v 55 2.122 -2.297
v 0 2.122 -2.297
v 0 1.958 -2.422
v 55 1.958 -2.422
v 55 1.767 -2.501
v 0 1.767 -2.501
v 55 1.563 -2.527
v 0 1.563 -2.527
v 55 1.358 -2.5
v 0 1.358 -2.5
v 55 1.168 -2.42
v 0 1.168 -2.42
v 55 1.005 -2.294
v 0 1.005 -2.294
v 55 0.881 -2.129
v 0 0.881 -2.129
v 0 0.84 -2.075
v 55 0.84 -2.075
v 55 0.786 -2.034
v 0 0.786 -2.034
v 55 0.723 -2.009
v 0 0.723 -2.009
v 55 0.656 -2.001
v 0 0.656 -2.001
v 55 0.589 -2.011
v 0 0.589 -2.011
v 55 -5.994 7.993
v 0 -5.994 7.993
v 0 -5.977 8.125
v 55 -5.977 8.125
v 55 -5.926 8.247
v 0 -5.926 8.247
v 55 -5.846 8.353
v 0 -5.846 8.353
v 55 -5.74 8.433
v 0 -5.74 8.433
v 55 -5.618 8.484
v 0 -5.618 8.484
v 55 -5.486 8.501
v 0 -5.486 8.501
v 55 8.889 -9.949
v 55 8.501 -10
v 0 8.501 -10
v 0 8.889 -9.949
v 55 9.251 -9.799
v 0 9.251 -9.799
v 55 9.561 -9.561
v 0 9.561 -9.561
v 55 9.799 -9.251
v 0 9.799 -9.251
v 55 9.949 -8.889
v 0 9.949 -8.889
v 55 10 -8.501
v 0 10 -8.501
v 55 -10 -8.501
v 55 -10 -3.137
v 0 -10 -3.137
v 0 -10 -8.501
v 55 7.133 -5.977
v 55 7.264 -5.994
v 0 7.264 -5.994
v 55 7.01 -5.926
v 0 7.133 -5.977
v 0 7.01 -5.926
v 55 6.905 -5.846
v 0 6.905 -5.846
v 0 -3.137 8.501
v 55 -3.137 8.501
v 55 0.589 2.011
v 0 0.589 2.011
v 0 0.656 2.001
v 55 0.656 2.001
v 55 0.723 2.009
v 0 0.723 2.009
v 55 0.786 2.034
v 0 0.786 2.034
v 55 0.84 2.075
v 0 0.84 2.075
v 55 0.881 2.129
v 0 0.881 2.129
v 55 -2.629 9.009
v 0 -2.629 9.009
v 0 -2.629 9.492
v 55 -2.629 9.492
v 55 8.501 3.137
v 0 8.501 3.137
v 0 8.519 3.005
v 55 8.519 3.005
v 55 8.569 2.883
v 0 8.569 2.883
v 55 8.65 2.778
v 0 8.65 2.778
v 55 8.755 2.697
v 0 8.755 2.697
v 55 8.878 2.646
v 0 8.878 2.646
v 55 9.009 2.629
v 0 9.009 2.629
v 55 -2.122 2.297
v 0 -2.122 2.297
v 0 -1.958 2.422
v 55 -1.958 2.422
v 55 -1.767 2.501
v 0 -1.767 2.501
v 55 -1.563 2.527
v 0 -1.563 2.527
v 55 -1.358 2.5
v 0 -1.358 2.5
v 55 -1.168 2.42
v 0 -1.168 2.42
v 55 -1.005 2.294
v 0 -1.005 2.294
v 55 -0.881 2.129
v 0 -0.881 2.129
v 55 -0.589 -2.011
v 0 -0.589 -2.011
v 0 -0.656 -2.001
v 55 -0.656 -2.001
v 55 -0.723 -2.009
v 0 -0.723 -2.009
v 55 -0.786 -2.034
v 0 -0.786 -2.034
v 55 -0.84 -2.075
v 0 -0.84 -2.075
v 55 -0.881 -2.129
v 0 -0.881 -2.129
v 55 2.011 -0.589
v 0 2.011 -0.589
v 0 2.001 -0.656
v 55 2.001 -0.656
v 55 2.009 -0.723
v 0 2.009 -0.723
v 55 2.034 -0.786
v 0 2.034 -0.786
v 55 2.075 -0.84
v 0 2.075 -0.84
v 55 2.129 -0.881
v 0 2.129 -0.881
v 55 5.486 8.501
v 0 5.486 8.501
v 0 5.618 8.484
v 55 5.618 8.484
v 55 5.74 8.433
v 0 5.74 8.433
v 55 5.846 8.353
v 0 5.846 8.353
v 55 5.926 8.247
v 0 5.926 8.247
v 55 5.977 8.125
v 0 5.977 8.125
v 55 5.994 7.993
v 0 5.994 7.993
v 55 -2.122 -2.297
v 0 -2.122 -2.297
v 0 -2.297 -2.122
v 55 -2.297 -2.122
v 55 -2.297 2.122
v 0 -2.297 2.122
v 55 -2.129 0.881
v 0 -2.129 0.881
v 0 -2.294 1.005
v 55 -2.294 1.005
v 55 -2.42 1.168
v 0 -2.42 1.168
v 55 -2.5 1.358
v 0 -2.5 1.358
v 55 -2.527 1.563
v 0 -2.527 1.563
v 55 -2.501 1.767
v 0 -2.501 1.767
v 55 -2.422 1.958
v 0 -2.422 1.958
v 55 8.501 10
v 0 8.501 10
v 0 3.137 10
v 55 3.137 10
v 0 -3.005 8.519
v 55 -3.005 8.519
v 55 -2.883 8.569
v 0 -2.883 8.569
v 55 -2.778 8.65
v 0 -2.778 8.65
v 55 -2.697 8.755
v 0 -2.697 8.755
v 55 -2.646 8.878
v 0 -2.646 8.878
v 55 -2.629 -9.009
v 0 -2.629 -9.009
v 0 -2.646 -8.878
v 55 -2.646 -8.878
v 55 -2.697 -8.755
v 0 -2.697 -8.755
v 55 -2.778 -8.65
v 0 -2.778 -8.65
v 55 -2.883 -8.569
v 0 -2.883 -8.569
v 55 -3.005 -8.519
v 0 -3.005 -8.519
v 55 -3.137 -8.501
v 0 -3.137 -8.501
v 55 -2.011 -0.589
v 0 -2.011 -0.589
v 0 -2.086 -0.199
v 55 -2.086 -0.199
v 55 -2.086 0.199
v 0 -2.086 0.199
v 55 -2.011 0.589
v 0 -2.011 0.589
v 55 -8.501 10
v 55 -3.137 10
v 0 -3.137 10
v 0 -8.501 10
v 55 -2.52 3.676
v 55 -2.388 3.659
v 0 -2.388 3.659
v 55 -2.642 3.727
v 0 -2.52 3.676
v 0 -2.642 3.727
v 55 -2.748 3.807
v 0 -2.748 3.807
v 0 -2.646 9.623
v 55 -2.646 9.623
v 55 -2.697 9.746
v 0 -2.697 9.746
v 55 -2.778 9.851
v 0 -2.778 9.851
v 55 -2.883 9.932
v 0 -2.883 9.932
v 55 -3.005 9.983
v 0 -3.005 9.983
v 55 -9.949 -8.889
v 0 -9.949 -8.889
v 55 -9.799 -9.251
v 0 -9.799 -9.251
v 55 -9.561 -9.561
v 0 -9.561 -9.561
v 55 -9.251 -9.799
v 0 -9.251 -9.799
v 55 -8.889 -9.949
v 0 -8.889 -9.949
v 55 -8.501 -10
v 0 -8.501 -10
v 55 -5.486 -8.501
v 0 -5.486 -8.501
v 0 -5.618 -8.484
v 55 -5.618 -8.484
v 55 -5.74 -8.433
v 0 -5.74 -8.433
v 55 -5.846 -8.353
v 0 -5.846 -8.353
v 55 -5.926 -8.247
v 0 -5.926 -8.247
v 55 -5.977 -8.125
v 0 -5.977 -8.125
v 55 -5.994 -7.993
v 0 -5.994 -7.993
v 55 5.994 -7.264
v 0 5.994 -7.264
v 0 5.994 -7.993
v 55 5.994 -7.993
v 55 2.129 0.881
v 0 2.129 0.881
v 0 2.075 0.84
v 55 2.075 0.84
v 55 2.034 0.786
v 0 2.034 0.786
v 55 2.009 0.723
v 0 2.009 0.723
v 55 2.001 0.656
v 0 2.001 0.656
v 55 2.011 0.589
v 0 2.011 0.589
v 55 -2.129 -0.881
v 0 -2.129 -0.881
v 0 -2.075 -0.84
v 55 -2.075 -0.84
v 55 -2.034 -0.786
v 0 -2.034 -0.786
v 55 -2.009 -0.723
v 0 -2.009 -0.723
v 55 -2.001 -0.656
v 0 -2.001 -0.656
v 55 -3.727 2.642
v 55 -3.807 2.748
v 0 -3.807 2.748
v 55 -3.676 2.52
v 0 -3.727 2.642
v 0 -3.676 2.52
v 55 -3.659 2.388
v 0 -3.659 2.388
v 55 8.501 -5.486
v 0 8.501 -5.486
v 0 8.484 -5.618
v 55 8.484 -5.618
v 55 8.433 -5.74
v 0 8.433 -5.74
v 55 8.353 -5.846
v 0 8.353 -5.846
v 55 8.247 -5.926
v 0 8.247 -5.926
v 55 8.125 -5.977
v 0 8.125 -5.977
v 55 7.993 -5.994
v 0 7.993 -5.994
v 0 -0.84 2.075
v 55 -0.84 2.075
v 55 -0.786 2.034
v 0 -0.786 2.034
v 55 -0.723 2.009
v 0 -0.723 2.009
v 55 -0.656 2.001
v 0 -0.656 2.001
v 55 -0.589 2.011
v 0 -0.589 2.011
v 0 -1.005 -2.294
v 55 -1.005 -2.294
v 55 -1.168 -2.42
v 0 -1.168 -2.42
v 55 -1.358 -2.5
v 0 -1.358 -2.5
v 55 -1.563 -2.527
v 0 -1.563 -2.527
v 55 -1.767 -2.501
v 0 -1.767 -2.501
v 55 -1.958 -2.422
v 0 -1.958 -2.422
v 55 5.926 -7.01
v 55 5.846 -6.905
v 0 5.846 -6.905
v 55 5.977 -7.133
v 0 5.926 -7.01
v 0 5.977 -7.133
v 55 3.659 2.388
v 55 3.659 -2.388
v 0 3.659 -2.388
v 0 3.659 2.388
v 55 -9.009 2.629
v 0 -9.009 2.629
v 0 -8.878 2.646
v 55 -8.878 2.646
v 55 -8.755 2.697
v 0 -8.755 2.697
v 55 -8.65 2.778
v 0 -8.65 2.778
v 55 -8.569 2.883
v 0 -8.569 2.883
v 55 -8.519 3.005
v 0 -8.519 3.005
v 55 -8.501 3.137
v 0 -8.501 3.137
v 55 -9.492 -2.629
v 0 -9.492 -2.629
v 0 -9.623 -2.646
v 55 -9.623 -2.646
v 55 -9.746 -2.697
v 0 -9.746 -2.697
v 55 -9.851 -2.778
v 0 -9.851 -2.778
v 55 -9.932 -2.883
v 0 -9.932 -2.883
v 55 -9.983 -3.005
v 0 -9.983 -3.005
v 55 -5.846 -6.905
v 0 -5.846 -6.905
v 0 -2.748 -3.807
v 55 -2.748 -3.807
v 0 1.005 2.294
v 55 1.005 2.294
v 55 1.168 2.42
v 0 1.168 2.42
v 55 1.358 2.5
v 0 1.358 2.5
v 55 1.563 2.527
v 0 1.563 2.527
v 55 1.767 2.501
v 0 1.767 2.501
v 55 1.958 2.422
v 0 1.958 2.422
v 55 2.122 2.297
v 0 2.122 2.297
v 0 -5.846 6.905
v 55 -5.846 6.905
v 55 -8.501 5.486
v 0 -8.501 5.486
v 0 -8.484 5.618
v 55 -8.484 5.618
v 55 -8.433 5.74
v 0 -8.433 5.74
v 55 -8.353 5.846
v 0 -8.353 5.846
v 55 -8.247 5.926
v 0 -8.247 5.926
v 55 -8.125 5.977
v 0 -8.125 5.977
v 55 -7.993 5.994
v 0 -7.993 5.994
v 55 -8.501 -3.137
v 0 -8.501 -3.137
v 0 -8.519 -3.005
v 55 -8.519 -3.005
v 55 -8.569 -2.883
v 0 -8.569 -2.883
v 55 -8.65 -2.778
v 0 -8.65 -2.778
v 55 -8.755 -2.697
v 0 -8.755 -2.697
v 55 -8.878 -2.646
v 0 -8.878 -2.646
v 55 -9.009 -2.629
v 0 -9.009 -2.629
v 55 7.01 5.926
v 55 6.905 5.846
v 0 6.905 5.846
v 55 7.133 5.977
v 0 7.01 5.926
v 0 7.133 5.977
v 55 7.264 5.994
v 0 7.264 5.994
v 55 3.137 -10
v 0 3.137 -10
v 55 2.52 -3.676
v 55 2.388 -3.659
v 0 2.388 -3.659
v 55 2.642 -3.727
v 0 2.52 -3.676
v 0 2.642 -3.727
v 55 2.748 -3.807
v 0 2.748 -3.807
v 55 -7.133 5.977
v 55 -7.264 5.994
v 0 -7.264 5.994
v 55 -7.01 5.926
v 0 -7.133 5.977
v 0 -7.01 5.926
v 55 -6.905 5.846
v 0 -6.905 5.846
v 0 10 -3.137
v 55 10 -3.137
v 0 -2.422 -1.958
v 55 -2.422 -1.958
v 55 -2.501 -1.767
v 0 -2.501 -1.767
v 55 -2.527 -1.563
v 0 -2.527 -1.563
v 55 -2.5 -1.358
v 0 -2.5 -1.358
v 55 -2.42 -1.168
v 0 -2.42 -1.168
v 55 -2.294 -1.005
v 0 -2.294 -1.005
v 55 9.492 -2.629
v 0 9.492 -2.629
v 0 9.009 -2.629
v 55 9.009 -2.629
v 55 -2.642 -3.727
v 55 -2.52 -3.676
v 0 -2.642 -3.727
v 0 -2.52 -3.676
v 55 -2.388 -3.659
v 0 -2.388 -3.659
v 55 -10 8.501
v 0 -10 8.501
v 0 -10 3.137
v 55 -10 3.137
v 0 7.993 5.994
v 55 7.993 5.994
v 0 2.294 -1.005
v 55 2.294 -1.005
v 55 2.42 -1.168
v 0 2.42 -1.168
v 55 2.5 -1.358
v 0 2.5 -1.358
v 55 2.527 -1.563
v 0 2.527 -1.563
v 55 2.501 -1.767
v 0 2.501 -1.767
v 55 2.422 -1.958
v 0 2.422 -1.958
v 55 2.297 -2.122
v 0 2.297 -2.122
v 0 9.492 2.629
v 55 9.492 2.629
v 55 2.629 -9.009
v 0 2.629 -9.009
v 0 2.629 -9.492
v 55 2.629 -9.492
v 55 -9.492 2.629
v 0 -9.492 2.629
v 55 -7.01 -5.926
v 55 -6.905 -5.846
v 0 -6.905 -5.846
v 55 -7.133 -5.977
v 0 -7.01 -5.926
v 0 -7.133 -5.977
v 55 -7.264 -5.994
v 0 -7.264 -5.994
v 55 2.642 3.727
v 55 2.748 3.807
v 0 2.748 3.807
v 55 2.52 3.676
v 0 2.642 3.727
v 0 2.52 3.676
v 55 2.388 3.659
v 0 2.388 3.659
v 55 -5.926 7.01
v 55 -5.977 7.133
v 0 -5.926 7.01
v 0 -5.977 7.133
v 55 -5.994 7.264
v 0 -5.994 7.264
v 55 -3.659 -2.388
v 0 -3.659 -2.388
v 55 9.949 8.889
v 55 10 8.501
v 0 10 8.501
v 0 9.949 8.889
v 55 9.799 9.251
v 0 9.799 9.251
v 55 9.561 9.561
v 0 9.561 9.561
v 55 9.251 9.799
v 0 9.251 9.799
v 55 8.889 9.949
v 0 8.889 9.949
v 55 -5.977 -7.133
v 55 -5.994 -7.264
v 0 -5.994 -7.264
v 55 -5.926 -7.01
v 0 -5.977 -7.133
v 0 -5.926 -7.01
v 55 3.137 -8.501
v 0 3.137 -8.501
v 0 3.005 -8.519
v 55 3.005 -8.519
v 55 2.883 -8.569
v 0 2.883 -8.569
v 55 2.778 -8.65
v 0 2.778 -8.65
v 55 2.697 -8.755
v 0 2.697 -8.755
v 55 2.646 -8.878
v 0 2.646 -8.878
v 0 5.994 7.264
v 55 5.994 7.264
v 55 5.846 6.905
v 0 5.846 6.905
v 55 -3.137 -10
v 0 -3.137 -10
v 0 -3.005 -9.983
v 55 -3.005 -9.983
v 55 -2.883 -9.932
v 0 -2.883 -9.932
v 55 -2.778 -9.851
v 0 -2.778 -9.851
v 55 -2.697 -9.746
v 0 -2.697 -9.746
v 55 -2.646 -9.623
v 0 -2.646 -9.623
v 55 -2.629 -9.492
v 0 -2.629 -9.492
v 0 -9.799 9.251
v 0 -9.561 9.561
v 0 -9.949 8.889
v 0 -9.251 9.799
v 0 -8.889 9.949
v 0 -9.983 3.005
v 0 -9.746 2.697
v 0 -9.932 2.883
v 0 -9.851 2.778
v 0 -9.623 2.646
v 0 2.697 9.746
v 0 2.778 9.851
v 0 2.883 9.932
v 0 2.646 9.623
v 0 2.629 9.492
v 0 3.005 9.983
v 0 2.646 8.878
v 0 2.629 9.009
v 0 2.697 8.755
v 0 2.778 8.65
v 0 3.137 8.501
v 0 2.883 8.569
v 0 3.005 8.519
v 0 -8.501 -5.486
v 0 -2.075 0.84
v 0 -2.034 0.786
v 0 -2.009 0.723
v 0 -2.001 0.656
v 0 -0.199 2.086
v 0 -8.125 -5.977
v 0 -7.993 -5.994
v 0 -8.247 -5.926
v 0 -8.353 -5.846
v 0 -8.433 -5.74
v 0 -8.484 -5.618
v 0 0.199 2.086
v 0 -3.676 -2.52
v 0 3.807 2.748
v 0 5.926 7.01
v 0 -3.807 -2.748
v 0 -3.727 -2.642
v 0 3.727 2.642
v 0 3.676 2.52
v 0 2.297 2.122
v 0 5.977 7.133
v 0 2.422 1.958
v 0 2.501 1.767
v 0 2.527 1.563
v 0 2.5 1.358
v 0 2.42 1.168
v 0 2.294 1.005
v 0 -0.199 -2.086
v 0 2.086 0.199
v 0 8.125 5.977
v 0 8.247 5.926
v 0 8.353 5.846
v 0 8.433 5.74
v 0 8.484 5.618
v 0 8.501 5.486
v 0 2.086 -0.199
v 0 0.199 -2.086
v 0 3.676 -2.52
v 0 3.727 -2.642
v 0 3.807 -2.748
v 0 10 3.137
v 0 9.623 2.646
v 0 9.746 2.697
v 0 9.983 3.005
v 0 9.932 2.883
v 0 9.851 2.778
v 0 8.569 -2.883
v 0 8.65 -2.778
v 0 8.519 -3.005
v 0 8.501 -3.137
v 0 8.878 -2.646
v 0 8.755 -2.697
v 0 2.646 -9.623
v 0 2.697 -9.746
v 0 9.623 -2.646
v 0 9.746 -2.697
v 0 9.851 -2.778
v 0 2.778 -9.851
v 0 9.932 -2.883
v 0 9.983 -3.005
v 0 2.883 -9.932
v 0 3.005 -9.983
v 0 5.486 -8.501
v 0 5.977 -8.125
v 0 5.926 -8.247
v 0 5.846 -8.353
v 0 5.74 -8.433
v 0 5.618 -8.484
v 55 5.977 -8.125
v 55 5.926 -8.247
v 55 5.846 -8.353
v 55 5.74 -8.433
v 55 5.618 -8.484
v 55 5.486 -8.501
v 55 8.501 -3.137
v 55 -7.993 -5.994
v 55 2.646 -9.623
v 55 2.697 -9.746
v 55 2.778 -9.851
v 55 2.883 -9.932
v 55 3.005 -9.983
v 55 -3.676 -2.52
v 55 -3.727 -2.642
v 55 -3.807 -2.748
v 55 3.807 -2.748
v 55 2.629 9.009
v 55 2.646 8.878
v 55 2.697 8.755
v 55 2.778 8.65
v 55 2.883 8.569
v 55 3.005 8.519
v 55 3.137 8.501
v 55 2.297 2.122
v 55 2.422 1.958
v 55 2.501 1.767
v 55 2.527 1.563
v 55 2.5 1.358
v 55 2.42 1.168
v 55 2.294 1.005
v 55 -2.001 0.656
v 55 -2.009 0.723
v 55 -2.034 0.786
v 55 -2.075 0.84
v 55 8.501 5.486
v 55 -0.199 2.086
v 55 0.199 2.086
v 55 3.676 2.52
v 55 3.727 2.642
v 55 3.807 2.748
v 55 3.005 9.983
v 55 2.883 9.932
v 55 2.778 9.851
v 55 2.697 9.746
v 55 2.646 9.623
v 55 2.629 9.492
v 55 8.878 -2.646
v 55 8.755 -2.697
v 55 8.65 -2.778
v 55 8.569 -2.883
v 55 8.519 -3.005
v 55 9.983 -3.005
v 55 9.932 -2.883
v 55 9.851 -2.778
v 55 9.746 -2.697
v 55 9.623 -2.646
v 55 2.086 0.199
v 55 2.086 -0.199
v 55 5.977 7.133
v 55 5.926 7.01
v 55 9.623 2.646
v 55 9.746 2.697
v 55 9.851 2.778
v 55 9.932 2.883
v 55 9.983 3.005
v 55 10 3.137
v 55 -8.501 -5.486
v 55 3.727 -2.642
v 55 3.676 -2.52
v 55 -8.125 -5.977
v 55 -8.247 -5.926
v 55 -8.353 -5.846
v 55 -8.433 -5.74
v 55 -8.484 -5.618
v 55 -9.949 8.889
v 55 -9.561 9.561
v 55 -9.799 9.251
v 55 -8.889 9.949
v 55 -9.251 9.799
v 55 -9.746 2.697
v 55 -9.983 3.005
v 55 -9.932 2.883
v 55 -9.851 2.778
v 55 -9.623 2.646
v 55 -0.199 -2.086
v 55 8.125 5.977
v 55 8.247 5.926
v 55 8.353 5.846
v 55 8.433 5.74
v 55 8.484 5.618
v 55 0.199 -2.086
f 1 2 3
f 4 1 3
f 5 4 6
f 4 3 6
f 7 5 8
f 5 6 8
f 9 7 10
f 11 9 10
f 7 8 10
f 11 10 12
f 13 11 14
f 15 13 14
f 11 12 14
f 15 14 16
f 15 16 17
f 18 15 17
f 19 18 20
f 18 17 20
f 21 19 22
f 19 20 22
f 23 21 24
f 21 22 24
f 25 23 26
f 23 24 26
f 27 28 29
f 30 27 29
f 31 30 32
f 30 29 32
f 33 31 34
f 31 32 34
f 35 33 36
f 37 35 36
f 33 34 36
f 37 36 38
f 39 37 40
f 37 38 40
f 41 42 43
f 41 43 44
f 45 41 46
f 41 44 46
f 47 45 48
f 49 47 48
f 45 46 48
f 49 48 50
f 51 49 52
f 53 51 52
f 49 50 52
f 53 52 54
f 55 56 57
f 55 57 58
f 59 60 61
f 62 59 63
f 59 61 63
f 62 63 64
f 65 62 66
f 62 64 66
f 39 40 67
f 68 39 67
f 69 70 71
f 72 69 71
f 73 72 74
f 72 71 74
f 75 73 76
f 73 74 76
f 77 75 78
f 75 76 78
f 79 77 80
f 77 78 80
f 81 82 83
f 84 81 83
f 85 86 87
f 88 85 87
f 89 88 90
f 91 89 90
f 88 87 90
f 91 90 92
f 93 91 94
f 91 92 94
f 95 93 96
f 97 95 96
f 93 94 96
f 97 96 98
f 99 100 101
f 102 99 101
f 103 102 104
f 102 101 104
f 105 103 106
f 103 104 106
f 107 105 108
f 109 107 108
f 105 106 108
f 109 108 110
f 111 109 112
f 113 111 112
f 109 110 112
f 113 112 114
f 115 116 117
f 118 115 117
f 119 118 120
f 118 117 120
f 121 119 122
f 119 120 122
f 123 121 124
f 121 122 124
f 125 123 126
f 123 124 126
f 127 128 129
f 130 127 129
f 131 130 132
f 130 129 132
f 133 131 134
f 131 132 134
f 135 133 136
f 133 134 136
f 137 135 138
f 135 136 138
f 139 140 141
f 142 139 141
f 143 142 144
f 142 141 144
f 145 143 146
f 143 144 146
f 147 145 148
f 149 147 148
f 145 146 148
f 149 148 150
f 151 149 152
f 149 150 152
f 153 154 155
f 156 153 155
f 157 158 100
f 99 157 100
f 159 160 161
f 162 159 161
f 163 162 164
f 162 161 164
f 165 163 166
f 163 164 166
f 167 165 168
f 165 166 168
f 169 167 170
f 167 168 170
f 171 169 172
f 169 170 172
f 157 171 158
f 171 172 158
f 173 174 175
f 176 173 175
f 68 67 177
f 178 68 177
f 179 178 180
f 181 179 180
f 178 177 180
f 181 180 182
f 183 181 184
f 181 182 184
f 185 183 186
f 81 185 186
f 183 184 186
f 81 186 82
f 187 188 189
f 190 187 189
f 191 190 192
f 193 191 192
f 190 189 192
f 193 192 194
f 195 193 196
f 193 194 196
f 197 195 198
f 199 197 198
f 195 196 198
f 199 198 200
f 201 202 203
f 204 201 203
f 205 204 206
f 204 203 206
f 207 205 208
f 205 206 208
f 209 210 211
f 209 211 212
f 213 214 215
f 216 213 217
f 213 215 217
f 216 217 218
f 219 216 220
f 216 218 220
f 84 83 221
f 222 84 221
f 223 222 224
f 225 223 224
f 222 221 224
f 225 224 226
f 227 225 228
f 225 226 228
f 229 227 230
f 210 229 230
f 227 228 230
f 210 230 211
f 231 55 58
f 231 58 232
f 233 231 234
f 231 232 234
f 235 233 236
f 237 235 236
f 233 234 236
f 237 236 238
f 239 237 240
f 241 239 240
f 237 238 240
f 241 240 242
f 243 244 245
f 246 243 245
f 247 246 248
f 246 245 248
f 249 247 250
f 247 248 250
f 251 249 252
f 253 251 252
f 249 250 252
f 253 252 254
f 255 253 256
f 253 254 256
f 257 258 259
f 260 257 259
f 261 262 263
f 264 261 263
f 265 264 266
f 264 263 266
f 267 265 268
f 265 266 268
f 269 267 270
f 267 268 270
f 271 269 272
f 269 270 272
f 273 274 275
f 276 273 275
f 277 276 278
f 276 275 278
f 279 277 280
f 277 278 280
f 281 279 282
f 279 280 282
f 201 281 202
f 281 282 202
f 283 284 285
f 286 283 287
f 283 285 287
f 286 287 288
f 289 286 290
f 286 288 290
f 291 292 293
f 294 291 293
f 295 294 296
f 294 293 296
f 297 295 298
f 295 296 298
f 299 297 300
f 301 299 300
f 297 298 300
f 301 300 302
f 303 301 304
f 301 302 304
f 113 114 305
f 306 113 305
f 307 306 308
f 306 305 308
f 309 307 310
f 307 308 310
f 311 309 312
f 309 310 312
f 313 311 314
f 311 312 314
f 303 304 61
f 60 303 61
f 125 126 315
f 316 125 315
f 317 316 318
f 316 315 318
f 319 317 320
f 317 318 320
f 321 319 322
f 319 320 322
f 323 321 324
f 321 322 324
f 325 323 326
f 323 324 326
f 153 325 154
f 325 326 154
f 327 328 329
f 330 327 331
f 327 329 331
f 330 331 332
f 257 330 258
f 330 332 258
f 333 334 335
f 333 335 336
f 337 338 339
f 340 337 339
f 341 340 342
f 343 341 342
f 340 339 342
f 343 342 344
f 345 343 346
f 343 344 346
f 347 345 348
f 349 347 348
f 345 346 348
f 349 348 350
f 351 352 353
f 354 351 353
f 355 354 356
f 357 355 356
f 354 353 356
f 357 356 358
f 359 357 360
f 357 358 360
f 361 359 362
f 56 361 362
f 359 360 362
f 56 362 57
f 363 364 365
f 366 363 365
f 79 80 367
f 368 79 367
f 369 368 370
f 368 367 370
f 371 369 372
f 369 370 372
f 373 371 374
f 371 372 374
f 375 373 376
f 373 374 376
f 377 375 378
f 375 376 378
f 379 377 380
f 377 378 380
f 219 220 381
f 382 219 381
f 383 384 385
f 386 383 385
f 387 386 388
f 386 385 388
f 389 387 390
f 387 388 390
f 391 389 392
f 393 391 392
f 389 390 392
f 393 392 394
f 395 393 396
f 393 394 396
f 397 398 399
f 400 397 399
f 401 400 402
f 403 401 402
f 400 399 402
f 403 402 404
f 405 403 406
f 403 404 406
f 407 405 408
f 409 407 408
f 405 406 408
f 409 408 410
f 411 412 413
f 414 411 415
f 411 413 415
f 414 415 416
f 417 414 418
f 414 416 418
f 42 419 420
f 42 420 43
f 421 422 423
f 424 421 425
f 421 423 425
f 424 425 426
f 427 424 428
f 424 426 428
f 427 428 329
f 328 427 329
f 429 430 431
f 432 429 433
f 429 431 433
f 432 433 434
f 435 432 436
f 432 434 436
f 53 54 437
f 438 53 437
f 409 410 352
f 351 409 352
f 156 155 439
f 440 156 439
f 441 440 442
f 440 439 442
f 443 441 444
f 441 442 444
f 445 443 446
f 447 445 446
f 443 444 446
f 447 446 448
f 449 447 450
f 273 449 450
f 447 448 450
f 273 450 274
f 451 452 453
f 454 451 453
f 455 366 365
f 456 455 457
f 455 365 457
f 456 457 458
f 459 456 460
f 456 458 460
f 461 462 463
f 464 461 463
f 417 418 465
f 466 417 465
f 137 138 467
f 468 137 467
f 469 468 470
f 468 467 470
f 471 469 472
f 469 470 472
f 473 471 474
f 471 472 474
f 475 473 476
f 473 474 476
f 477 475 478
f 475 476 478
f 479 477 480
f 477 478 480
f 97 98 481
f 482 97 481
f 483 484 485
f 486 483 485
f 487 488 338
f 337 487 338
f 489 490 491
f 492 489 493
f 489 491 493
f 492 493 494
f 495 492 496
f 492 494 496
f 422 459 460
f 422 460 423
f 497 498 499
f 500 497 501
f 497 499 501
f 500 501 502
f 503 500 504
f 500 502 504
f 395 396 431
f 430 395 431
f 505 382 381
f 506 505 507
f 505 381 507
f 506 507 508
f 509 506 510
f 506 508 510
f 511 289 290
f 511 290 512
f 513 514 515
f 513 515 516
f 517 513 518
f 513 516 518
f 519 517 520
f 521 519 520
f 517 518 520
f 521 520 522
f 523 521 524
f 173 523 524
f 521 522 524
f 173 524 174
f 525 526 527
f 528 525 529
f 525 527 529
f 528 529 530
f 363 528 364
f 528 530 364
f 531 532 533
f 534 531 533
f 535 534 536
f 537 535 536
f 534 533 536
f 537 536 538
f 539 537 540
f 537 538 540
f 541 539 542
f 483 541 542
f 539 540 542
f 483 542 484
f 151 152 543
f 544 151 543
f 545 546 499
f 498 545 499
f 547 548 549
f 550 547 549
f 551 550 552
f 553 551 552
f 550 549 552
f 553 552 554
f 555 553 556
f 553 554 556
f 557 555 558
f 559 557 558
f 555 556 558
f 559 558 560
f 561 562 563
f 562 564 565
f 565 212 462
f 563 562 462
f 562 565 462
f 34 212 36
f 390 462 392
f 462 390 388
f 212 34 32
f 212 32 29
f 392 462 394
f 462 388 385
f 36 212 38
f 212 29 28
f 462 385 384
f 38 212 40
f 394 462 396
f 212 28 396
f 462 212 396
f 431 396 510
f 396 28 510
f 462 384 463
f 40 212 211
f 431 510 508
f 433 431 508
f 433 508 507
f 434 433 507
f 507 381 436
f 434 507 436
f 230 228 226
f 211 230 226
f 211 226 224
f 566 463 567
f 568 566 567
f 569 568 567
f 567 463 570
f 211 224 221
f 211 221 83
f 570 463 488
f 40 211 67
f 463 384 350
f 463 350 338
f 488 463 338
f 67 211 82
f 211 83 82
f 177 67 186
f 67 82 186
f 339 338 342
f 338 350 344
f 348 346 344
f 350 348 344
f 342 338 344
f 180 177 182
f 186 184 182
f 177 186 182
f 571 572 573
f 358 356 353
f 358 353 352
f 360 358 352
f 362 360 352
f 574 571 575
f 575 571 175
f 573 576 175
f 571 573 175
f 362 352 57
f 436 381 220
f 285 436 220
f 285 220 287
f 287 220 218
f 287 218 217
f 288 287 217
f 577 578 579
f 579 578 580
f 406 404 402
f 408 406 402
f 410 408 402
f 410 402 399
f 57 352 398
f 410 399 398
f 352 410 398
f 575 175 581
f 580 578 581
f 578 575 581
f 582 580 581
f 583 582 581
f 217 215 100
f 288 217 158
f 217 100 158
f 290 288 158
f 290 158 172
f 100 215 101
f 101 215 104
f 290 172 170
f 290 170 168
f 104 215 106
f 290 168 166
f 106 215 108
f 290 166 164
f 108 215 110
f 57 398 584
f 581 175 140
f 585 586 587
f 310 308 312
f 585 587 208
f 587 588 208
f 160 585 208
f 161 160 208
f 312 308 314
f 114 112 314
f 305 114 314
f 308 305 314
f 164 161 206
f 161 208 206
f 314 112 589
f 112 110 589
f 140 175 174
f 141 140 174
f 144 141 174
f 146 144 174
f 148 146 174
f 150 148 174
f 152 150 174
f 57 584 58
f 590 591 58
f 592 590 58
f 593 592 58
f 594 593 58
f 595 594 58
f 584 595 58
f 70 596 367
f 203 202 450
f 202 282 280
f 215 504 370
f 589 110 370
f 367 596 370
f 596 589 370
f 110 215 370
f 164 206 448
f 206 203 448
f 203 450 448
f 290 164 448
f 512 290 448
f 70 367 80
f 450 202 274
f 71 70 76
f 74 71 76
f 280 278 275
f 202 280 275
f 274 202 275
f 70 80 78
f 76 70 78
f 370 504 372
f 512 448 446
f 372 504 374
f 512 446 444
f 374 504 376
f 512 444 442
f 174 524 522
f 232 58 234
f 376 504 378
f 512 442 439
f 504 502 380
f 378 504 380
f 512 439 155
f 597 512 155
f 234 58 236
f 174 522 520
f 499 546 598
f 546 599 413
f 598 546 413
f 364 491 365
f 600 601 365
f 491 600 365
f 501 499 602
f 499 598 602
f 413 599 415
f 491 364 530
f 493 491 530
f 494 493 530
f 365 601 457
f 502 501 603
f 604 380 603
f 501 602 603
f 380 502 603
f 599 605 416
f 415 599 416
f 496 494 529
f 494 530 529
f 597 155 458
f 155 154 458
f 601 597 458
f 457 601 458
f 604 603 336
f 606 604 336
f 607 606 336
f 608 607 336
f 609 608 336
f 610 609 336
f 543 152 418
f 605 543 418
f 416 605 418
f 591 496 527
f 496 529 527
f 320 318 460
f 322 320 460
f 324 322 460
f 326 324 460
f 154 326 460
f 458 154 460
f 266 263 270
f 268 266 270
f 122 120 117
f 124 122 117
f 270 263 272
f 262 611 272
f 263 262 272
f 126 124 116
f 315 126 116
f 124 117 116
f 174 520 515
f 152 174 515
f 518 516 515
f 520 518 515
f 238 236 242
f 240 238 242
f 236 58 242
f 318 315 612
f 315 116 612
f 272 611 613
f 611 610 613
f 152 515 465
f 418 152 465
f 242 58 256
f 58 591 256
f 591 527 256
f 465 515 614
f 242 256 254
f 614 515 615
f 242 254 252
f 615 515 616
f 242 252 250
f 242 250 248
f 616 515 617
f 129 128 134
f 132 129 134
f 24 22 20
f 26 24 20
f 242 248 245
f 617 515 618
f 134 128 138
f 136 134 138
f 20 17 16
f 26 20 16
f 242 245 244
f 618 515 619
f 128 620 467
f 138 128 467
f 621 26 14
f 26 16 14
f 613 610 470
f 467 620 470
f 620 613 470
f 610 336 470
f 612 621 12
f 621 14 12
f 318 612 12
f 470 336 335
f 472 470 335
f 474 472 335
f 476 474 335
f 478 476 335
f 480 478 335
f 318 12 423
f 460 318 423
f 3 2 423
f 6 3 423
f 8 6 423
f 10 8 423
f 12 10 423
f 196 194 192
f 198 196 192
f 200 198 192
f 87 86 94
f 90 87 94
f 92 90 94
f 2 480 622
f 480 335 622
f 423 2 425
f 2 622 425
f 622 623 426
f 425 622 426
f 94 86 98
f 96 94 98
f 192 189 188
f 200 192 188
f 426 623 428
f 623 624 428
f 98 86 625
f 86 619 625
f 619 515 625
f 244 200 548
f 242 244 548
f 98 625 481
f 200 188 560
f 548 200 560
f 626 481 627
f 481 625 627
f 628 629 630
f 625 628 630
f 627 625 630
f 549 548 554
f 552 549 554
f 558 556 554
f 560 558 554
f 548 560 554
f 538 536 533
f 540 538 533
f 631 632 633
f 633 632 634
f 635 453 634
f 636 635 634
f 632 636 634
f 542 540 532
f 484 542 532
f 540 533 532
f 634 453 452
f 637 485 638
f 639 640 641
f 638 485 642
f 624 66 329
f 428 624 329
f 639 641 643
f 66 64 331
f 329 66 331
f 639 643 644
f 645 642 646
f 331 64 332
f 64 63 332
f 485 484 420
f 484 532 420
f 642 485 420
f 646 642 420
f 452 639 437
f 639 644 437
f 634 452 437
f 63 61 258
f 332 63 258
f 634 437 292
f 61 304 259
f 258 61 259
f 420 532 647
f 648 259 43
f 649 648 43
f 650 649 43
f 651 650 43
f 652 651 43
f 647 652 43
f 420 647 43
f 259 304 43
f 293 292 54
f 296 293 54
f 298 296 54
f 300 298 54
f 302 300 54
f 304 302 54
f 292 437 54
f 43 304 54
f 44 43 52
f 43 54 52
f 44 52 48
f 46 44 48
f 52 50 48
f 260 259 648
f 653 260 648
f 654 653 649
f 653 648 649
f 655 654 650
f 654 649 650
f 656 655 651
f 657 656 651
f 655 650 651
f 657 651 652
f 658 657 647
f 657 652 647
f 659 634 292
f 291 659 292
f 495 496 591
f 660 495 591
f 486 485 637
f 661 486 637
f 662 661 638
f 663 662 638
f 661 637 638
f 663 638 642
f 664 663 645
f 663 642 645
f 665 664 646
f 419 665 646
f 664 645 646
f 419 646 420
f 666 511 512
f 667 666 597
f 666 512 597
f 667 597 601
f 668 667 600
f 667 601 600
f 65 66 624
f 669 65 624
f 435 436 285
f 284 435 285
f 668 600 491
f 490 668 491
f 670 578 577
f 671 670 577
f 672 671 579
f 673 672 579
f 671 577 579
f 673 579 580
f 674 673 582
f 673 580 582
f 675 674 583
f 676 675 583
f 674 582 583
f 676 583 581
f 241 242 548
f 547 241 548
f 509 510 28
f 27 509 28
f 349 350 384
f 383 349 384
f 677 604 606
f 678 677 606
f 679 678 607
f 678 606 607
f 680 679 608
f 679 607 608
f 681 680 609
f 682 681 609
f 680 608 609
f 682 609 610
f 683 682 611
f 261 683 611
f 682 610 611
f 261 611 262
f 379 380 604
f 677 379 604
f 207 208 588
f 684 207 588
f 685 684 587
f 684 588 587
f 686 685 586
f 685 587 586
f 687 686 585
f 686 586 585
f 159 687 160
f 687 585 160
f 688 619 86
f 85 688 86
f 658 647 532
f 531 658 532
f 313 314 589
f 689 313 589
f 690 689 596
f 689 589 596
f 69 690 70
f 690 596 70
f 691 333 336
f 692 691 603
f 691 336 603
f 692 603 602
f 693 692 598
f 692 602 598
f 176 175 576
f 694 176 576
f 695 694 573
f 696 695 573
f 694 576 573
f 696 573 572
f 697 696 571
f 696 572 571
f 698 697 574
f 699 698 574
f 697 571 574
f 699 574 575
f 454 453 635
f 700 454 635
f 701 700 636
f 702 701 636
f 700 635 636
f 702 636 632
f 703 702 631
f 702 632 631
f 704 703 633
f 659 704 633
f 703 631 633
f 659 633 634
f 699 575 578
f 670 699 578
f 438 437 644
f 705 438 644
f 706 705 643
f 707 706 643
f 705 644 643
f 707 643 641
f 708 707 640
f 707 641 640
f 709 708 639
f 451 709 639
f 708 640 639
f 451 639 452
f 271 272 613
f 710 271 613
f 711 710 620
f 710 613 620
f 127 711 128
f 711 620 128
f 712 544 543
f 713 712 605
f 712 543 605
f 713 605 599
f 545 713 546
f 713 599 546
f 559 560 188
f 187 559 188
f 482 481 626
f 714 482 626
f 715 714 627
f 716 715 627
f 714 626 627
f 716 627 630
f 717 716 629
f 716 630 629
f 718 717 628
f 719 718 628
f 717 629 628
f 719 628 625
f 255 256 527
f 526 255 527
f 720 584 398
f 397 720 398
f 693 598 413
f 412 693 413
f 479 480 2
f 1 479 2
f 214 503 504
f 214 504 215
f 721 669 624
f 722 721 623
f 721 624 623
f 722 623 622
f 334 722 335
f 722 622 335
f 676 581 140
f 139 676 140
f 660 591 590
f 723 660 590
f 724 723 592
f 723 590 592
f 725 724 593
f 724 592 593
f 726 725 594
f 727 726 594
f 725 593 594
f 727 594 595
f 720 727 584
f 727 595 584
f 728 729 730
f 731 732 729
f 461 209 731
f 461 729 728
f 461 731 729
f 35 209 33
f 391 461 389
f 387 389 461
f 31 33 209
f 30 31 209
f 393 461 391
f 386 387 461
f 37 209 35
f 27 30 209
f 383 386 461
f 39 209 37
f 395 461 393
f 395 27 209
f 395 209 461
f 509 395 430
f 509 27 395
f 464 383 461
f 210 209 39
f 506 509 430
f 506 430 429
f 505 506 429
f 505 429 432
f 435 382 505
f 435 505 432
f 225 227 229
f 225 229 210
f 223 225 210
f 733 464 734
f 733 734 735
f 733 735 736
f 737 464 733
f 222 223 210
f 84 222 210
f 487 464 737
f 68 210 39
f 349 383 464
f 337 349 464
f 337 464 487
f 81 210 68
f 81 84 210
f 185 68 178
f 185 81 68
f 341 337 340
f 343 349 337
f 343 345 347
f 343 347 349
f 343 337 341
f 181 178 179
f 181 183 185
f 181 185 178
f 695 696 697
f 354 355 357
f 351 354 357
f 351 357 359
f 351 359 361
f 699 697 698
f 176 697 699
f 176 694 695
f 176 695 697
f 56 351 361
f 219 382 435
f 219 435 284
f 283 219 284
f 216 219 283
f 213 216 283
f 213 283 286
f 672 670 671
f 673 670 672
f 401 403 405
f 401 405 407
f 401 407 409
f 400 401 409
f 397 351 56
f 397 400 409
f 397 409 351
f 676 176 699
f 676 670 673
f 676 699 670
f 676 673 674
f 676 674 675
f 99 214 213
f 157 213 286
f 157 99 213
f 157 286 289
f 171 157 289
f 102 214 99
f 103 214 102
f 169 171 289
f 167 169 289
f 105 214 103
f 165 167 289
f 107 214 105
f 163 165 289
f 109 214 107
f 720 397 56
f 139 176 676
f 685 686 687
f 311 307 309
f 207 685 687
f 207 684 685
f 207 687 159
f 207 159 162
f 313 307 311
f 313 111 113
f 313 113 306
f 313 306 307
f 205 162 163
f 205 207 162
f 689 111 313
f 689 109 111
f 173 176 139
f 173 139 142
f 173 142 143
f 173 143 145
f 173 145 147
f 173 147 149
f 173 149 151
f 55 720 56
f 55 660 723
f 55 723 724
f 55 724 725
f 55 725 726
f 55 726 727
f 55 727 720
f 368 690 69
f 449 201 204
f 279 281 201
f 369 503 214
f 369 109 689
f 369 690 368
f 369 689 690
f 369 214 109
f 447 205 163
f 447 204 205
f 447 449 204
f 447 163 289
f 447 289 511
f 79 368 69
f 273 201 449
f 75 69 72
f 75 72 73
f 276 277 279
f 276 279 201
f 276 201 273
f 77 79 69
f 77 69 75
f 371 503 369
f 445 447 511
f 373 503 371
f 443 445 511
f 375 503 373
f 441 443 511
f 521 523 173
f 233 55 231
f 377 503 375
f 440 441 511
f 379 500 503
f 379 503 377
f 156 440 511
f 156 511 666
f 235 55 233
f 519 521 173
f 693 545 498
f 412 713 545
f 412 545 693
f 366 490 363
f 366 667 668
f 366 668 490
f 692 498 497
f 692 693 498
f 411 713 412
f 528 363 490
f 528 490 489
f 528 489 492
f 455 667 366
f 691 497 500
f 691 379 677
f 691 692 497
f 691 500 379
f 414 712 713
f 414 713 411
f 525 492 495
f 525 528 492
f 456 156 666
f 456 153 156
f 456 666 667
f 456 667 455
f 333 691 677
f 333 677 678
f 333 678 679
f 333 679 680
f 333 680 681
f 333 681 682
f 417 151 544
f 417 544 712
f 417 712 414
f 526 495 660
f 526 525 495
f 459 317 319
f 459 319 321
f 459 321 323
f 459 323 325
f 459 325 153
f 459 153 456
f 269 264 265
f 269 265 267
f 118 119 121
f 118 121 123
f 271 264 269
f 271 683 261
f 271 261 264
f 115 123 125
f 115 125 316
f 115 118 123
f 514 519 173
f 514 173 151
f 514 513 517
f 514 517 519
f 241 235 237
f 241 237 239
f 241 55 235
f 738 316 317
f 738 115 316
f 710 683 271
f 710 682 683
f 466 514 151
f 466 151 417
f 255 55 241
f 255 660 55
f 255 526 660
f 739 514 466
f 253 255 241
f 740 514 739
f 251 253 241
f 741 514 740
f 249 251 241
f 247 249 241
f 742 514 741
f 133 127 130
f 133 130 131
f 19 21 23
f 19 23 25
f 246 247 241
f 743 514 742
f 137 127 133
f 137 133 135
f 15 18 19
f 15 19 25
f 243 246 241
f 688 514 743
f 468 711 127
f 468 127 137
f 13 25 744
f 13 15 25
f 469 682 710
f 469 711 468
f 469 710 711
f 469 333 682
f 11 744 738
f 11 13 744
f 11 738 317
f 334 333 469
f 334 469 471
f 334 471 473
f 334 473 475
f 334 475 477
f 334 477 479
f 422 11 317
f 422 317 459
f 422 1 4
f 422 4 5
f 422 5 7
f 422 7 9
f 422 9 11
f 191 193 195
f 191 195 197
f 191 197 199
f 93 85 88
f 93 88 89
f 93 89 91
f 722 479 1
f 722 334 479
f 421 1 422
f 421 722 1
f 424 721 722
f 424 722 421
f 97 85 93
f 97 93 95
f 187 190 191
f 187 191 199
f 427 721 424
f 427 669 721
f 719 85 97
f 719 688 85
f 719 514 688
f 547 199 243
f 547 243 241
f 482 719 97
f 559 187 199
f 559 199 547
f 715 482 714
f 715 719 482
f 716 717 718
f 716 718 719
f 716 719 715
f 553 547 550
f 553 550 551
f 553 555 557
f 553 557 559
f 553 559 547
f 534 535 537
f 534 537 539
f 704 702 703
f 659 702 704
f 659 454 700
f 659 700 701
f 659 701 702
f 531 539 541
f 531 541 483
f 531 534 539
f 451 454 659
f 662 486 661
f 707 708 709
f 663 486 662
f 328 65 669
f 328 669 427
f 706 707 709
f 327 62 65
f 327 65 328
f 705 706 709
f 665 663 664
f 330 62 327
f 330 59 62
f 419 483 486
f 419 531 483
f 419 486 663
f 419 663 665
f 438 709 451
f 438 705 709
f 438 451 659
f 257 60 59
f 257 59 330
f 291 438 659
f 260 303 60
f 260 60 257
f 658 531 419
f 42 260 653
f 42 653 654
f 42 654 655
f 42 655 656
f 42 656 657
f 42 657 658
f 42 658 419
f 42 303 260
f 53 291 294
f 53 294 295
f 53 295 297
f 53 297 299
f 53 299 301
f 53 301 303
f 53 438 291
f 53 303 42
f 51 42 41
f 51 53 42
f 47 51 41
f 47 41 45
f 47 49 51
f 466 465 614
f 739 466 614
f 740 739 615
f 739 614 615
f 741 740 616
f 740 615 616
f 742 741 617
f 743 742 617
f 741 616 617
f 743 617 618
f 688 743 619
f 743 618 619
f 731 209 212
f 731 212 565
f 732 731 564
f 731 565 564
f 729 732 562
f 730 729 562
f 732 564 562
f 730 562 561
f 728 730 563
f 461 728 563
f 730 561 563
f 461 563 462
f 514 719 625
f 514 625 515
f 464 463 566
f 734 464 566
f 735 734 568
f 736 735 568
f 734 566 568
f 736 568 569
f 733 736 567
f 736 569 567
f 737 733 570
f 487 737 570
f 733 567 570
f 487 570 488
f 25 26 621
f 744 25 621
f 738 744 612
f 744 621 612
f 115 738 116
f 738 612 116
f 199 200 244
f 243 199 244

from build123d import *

# Parameters (mm, degrees)
F_20_SERIES_20_2020_1_DEPTH = 55


with BuildPart() as part:
    # Sketch11 → 20_series 20-2020(1) (new body)
    with BuildSketch(Plane(origin=(0, 0, 0), x_dir=(0, 0, -1), z_dir=(1, 0, 0))):
        with BuildLine():
            Line((9.0094, 2.6289), (9.492, 2.6289))
            ThreePointArc((9.492, 2.6289), (9.851210245, 2.777689755), (10, 3.1369))
            Line((10, 3.1369), (10, 8.5014))
            ThreePointArc((10, 8.5014), (9.561070222, 9.561070222), (8.5014, 10))
            Line((8.5014, 10), (3.1369, 10))
            ThreePointArc((3.1369, 10), (2.777689755, 9.851210245), (2.6289, 9.492))
            Line((2.6289, 9.492), (2.6289, 9.0094))
            ThreePointArc((2.6289, 9.0094), (2.777689755, 8.650189755), (3.1369, 8.5014))
            Line((3.1369, 8.5014), (5.4864, 8.5014))
            ThreePointArc((5.4864, 8.5014), (5.845610245, 8.352610245), (5.9944, 7.9934))
            Line((5.9944, 7.9934), (5.9944, 7.264490712))
            ThreePointArc((5.9944, 7.264490712), (5.955730803, 7.070087528), (5.845610245, 6.905280467))
            Line((5.845610245, 6.905280467), (2.747686782, 3.807357004))
            ThreePointArc((2.747686782, 3.807357004), (2.582879721, 3.697236446), (2.388476537, 3.658567249))
            Line((2.388476537, 3.658567249), (-2.388476537, 3.658567249))
            ThreePointArc((-2.388476537, 3.658567249), (-2.582879721, 3.697236446), (-2.747686782, 3.807357004))
            Line((-2.747686782, 3.807357004), (-5.845610245, 6.905280467))
            ThreePointArc((-5.845610245, 6.905280467), (-5.955730803, 7.070087528), (-5.9944, 7.264490712))
            Line((-5.9944, 7.264490712), (-5.9944, 7.9934))
            ThreePointArc((-5.9944, 7.9934), (-5.845610245, 8.352610245), (-5.4864, 8.5014))
            Line((-5.4864, 8.5014), (-3.1369, 8.5014))
            ThreePointArc((-3.1369, 8.5014), (-2.777689755, 8.650189755), (-2.6289, 9.0094))
            Line((-2.6289, 9.0094), (-2.6289, 9.492))
            ThreePointArc((-2.6289, 9.492), (-2.777689755, 9.851210245), (-3.1369, 10))
            Line((-3.1369, 10), (-8.5014, 10))
            ThreePointArc((-8.5014, 10), (-9.561070222, 9.561070222), (-10, 8.5014))
            Line((-10, 8.5014), (-10, 3.1369))
            ThreePointArc((-10, 3.1369), (-9.851210245, 2.777689755), (-9.492, 2.6289))
            Line((-9.492, 2.6289), (-9.0094, 2.6289))
            ThreePointArc((-9.0094, 2.6289), (-8.650189755, 2.777689755), (-8.5014, 3.1369))
            Line((-8.5014, 3.1369), (-8.5014, 5.4864))
            ThreePointArc((-8.5014, 5.4864), (-8.352610245, 5.845610245), (-7.9934, 5.9944))
            Line((-7.9934, 5.9944), (-7.264490712, 5.9944))
            ThreePointArc((-7.264490712, 5.9944), (-7.070087528, 5.955730803), (-6.905280467, 5.845610245))
            Line((-6.905280467, 5.845610245), (-3.807357004, 2.747686782))
            ThreePointArc((-3.807357004, 2.747686782), (-3.697236446, 2.582879721), (-3.658567249, 2.388476537))
            Line((-3.658567249, 2.388476537), (-3.658567249, -2.388476537))
            ThreePointArc((-3.658567249, -2.388476537), (-3.697236446, -2.582879721), (-3.807357004, -2.747686782))
            Line((-3.807357004, -2.747686782), (-6.905280467, -5.845610245))
            ThreePointArc((-6.905280467, -5.845610245), (-7.070087528, -5.955730803), (-7.264490712, -5.9944))
            Line((-7.264490712, -5.9944), (-7.9934, -5.9944))
            ThreePointArc((-7.9934, -5.9944), (-8.352610245, -5.845610245), (-8.5014, -5.4864))
            Line((-8.5014, -5.4864), (-8.5014, -3.1369))
            ThreePointArc((-8.5014, -3.1369), (-8.650189755, -2.777689755), (-9.0094, -2.6289))
            Line((-9.0094, -2.6289), (-9.492, -2.6289))
            ThreePointArc((-9.492, -2.6289), (-9.851210245, -2.777689755), (-10, -3.1369))
            Line((-10, -3.1369), (-10, -8.5014))
            ThreePointArc((-10, -8.5014), (-9.561070222, -9.561070222), (-8.5014, -10))
            Line((-8.5014, -10), (-3.1369, -10))
            ThreePointArc((-3.1369, -10), (-2.777689755, -9.851210245), (-2.6289, -9.492))
            Line((-2.6289, -9.492), (-2.6289, -9.0094))
            ThreePointArc((-2.6289, -9.0094), (-2.777689755, -8.650189755), (-3.1369, -8.5014))
            Line((-3.1369, -8.5014), (-5.4864, -8.5014))
            ThreePointArc((-5.4864, -8.5014), (-5.845610245, -8.352610245), (-5.9944, -7.9934))
            Line((-5.9944, -7.9934), (-5.9944, -7.264490712))
            ThreePointArc((-5.9944, -7.264490712), (-5.955730803, -7.070087528), (-5.845610245, -6.905280467))
            Line((-5.845610245, -6.905280467), (-2.747686782, -3.807357004))
            ThreePointArc((-2.747686782, -3.807357004), (-2.582879721, -3.697236446), (-2.388476537, -3.658567249))
            Line((-2.388476537, -3.658567249), (2.388476537, -3.658567249))
            ThreePointArc((2.388476537, -3.658567249), (2.582879721, -3.697236446), (2.747686782, -3.807357004))
            Line((2.747686782, -3.807357004), (5.845610245, -6.905280467))
            ThreePointArc((5.845610245, -6.905280467), (5.955730803, -7.070087528), (5.9944, -7.264490712))
            Line((5.9944, -7.264490712), (5.9944, -7.9934))
            ThreePointArc((5.9944, -7.9934), (5.845610245, -8.352610245), (5.4864, -8.5014))
            Line((5.4864, -8.5014), (3.1369, -8.5014))
            ThreePointArc((3.1369, -8.5014), (2.777689755, -8.650189755), (2.6289, -9.0094))
            Line((2.6289, -9.0094), (2.6289, -9.492))
            ThreePointArc((2.6289, -9.492), (2.777689755, -9.851210245), (3.1369, -10))
            Line((3.1369, -10), (8.5014, -10))
            ThreePointArc((8.5014, -10), (9.561070222, -9.561070222), (10, -8.5014))
            Line((10, -8.5014), (10, -3.1369))
            ThreePointArc((10, -3.1369), (9.851210245, -2.777689755), (9.492, -2.6289))
            Line((9.492, -2.6289), (9.0094, -2.6289))
            ThreePointArc((9.0094, -2.6289), (8.650189755, -2.777689755), (8.5014, -3.1369))
            Line((8.5014, -3.1369), (8.5014, -5.4864))
            ThreePointArc((8.5014, -5.4864), (8.352610245, -5.845610245), (7.9934, -5.9944))
            Line((7.9934, -5.9944), (7.264490712, -5.9944))
            ThreePointArc((7.264490712, -5.9944), (7.070087528, -5.955730803), (6.905280467, -5.845610245))
            Line((6.905280467, -5.845610245), (3.807357004, -2.747686782))
            ThreePointArc((3.807357004, -2.747686782), (3.697236446, -2.582879721), (3.658567249, -2.388476537))
            Line((3.658567249, -2.388476537), (3.658567249, 2.388476537))
            ThreePointArc((3.658567249, 2.388476537), (3.697236446, 2.582879721), (3.807357004, 2.747686782))
            Line((3.807357004, 2.747686782), (6.905280467, 5.845610245))
            ThreePointArc((6.905280467, 5.845610245), (7.070087528, 5.955730803), (7.264490712, 5.9944))
            Line((7.264490712, 5.9944), (7.9934, 5.9944))
            ThreePointArc((7.9934, 5.9944), (8.352610245, 5.845610245), (8.5014, 5.4864))
            Line((8.5014, 5.4864), (8.5014, 3.1369))
            ThreePointArc((8.5014, 3.1369), (8.650189755, 2.777689755), (9.0094, 2.6289))
        make_face()
        with BuildLine():
            Line((-2.296558466, 2.121727546), (-2.121727546, 2.296558466))
            ThreePointArc((-2.121727546, 2.296558466), (-1.459775814, 2.520126613), (-0.880635441, 2.129282347))
            ThreePointArc((-0.880635441, 2.129282347), (-0.755121693, 2.019456424), (-0.588548999, 2.011151493))
            ThreePointArc((-0.588548999, 2.011151493), (0, 2.0955), (0.588548999, 2.011151493))
            ThreePointArc((0.588548999, 2.011151493), (0.755121693, 2.019456424), (0.880635441, 2.129282347))
            ThreePointArc((0.880635441, 2.129282347), (1.459775814, 2.520126613), (2.121727546, 2.296558466))
            Line((2.121727546, 2.296558466), (2.296558466, 2.121727546))
            ThreePointArc((2.296558466, 2.121727546), (2.520126613, 1.459775814), (2.129282347, 0.880635441))
            ThreePointArc((2.129282347, 0.880635441), (2.019456424, 0.755121693), (2.011151493, 0.588548999))
            ThreePointArc((2.011151493, 0.588548999), (2.0955, 0), (2.011151493, -0.588548999))
            ThreePointArc((2.011151493, -0.588548999), (2.019456424, -0.755121693), (2.129282347, -0.880635441))
            ThreePointArc((2.129282347, -0.880635441), (2.520126613, -1.459775814), (2.296558466, -2.121727546))
            Line((2.296558466, -2.121727546), (2.121727546, -2.296558466))
            ThreePointArc((2.121727546, -2.296558466), (1.459775814, -2.520126613), (0.880635441, -2.129282347))
            ThreePointArc((0.880635441, -2.129282347), (0.755121693, -2.019456424), (0.588548999, -2.011151493))
            ThreePointArc((0.588548999, -2.011151493), (0, -2.0955), (-0.588548999, -2.011151493))
            ThreePointArc((-0.588548999, -2.011151493), (-0.755121693, -2.019456424), (-0.880635441, -2.129282347))
            ThreePointArc((-0.880635441, -2.129282347), (-1.459775814, -2.520126613), (-2.121727546, -2.296558466))
            Line((-2.121727546, -2.296558466), (-2.296558466, -2.121727546))
            ThreePointArc((-2.296558466, -2.121727546), (-2.520126613, -1.459775814), (-2.129282347, -0.880635441))
            ThreePointArc((-2.129282347, -0.880635441), (-2.019456424, -0.755121693), (-2.011151493, -0.588548999))
            ThreePointArc((-2.011151493, -0.588548999), (-2.0955, 0), (-2.011151493, 0.588548999))
            ThreePointArc((-2.011151493, 0.588548999), (-2.019456424, 0.755121693), (-2.129282347, 0.880635441))
            ThreePointArc((-2.129282347, 0.880635441), (-2.520126613, 1.459775814), (-2.296558466, 2.121727546))
        make_face(mode=Mode.SUBTRACT)
    extrude(amount=F_20_SERIES_20_2020_1_DEPTH)


solid = part.part
